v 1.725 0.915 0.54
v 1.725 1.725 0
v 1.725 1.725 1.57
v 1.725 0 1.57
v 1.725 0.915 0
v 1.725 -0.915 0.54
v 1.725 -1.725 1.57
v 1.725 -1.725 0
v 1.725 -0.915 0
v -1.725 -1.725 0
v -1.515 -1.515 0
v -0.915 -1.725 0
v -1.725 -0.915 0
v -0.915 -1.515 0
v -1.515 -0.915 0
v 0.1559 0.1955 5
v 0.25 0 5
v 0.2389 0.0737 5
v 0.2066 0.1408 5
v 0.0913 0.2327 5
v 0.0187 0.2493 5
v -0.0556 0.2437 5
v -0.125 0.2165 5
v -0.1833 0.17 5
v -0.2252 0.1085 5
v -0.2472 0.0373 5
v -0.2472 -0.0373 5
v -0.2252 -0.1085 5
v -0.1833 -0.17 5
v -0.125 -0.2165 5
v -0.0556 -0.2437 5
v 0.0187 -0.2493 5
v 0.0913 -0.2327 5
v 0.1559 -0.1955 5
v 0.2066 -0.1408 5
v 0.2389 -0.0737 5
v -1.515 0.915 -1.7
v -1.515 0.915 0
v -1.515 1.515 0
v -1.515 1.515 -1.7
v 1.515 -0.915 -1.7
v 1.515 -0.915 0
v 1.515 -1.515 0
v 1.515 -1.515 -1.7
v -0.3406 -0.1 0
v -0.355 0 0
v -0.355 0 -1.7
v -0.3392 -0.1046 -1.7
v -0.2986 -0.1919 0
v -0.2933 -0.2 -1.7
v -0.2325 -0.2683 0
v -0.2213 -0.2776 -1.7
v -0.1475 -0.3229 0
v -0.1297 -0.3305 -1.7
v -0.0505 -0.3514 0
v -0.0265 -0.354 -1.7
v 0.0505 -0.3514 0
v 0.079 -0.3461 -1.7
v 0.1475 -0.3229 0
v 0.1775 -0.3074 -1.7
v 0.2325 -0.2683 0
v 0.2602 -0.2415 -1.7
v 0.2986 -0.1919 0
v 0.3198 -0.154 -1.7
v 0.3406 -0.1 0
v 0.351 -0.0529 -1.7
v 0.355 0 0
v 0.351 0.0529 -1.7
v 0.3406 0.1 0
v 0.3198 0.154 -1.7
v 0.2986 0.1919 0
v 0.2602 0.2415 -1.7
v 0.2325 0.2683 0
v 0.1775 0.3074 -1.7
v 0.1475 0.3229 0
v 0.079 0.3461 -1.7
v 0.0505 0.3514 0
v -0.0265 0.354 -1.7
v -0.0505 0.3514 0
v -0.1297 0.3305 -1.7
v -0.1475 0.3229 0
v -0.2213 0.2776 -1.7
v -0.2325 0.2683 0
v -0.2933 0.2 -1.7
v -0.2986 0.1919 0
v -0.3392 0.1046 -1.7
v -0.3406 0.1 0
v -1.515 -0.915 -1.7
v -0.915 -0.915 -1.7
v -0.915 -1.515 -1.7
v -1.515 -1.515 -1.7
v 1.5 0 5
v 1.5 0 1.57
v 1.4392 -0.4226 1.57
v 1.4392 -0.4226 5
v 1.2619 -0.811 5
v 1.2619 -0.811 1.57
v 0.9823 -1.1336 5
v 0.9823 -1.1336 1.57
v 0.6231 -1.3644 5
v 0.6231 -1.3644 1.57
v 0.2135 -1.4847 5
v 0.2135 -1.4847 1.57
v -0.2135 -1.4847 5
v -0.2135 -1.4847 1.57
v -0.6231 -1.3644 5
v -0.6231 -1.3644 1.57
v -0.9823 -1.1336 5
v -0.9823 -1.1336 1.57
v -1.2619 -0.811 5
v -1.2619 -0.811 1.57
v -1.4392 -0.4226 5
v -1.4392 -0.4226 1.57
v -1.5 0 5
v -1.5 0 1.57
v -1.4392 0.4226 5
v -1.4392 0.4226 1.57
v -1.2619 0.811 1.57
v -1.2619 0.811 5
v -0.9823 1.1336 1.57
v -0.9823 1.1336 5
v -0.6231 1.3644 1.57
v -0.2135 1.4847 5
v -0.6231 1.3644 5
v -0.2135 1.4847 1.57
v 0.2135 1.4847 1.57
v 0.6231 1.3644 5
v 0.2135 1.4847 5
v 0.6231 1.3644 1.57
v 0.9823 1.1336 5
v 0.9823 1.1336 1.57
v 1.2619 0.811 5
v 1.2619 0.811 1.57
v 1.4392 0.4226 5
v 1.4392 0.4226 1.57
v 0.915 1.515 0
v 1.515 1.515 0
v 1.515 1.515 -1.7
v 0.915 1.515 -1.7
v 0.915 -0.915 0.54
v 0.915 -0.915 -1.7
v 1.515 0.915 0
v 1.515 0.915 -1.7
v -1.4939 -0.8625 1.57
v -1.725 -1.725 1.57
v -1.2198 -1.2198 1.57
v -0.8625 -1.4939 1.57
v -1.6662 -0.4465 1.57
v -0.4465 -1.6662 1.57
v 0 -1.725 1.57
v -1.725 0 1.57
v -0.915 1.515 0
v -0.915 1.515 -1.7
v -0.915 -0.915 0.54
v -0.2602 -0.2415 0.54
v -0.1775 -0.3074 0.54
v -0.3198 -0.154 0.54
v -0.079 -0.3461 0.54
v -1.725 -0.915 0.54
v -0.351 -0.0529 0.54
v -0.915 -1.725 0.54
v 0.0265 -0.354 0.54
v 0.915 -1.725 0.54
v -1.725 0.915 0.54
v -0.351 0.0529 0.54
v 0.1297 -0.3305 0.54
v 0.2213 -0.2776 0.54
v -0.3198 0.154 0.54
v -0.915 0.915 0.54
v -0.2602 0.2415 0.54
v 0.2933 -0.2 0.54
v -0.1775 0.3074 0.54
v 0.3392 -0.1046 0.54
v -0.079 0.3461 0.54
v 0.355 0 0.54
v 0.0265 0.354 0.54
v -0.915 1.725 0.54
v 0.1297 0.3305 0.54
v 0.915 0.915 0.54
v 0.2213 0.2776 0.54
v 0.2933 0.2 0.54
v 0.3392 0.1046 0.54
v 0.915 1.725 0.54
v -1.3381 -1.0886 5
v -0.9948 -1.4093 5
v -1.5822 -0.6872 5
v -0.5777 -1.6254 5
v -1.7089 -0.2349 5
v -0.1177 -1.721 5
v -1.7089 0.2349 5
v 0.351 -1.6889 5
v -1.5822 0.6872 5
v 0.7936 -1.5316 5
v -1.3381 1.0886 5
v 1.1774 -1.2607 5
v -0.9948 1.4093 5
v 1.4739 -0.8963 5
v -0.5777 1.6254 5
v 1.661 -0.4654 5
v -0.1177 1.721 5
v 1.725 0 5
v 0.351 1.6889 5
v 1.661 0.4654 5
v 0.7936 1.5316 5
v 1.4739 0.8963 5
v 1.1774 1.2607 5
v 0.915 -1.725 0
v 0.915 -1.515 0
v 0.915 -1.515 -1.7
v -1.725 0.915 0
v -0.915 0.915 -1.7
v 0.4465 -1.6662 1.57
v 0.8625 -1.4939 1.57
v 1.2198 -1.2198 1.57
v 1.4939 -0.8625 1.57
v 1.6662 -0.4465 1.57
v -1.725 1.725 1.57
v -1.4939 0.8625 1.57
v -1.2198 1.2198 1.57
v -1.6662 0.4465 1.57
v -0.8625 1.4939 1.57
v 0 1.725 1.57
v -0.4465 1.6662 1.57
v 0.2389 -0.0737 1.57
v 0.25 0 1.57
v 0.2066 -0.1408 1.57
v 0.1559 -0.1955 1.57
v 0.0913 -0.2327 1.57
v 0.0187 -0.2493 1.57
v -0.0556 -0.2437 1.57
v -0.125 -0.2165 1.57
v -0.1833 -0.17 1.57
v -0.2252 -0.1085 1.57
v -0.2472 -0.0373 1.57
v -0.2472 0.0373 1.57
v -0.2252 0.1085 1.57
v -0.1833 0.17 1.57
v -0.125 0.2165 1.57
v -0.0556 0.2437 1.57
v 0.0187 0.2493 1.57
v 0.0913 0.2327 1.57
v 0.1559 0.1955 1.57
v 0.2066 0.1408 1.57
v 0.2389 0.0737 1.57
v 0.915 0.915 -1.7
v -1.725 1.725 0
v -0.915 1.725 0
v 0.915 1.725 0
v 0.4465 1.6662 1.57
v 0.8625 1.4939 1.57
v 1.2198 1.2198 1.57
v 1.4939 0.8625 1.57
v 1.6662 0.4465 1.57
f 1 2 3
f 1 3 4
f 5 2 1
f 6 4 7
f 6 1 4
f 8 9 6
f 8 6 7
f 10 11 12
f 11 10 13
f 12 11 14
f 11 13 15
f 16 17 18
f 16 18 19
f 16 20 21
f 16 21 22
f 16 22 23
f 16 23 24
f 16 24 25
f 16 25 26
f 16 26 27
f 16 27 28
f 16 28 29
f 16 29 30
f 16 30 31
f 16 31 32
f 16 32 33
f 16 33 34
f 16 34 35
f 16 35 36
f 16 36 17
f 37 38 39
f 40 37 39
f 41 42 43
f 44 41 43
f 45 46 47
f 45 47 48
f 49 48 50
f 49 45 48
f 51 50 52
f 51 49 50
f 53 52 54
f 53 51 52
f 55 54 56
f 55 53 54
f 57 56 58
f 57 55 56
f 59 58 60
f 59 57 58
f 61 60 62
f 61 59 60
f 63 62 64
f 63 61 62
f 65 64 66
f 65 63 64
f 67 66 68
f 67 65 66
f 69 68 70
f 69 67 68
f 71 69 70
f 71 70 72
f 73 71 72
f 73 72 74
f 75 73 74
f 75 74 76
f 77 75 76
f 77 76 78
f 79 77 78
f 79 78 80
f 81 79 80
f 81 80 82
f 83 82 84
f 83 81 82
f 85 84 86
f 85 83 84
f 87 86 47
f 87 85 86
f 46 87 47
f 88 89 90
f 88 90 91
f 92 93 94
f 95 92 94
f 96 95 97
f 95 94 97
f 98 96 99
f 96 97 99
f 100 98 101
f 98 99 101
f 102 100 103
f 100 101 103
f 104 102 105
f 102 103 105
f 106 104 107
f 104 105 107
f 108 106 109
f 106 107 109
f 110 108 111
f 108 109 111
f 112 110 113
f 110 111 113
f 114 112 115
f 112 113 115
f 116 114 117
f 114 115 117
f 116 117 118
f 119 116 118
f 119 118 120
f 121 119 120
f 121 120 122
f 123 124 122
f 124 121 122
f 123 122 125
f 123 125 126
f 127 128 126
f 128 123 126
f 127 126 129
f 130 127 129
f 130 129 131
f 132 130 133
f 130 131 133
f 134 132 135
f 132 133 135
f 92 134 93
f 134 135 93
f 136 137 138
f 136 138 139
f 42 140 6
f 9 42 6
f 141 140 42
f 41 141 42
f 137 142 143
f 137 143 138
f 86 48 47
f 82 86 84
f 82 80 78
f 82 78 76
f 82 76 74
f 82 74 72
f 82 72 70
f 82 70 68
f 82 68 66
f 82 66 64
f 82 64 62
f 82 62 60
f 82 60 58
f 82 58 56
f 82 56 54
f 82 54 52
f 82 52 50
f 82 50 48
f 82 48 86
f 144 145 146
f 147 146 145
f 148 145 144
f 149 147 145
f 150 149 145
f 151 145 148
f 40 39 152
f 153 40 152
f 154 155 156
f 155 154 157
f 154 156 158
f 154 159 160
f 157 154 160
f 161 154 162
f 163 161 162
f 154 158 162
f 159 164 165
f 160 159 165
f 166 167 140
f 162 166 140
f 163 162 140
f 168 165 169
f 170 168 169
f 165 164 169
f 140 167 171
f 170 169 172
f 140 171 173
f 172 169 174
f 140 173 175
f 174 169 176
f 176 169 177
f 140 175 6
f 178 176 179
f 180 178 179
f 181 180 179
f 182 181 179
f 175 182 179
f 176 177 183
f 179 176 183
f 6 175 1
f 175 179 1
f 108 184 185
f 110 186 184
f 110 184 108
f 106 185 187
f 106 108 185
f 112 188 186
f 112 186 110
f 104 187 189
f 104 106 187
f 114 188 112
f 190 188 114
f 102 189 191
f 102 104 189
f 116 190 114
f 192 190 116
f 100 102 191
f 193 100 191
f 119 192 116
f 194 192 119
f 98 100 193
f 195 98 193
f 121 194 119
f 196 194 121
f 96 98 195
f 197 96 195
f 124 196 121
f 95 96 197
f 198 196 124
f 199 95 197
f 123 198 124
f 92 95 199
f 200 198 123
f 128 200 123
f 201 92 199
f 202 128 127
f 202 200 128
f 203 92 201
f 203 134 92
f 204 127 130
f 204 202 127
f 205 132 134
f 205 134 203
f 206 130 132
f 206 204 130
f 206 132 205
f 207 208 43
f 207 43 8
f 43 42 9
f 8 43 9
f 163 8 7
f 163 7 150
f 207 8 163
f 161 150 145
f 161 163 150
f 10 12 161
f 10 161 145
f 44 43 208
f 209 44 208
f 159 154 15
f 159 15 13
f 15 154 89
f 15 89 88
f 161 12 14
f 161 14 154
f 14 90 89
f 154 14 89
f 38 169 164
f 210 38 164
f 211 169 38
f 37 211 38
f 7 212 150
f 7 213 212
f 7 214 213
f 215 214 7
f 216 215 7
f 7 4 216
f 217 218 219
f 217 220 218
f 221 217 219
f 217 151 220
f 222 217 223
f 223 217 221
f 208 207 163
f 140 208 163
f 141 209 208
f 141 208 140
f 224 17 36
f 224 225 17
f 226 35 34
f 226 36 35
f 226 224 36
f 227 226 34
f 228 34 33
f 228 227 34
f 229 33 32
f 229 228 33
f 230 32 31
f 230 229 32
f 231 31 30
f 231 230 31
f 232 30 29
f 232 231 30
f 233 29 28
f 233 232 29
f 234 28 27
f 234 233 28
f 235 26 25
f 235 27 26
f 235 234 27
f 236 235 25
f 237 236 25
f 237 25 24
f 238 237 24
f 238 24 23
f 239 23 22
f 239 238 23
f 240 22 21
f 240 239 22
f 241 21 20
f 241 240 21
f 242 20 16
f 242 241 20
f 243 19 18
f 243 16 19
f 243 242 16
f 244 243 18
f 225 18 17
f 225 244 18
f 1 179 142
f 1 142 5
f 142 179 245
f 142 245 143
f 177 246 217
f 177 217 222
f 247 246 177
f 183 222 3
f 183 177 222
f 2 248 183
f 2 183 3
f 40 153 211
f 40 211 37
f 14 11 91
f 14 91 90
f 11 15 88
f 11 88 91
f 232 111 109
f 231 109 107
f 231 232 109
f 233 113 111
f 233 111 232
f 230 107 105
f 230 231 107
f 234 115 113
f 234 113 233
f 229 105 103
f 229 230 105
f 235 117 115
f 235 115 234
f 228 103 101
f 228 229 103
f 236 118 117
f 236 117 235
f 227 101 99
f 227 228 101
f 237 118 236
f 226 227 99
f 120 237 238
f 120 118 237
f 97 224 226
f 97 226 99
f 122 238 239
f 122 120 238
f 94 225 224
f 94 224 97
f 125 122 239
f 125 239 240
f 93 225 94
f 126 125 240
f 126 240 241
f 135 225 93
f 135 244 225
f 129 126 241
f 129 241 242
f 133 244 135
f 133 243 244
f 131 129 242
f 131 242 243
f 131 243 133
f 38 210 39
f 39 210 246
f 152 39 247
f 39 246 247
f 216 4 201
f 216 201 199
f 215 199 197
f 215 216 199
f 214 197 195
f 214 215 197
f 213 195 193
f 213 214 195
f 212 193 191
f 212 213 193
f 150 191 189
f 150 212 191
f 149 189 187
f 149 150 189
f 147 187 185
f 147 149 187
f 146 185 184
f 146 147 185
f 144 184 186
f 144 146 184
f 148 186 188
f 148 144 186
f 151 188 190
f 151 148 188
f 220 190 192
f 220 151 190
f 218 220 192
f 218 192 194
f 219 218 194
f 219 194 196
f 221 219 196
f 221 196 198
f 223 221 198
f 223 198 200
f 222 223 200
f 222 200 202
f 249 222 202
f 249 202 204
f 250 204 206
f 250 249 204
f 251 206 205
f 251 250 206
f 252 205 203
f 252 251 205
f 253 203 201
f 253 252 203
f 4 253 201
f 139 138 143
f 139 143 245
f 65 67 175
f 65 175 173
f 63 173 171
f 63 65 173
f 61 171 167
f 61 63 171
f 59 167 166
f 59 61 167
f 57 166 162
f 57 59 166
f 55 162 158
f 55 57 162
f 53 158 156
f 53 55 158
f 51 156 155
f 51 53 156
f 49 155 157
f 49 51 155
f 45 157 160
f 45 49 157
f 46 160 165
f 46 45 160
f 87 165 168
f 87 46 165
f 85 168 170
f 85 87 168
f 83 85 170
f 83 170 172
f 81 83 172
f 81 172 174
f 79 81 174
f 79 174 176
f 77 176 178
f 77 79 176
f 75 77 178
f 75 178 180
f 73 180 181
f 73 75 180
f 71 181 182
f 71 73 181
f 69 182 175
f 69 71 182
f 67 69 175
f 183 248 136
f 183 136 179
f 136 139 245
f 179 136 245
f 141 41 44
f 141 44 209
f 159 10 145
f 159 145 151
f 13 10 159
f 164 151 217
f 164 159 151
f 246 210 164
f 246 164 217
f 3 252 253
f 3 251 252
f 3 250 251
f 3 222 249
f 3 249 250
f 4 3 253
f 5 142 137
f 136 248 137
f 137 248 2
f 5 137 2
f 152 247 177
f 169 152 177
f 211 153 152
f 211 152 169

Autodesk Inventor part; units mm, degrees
ref_plane "YZ Plane" through (0, 0, 0) normal (1, 0, 0) x (0, 1, 0)
ref_plane "XZ Plane" through (0, 0, 0) normal (0, 1, 0) x (-1, 0, 0)
sketch "Sketch1" plane through (0, 0, 0) normal (0, 0, 1) x (1, 0, 0)
  line L0 (0, 0) -> (0.4099, 0)
  line L1 (0, 0) -> (0, 0.6993)
  circle A0 centre (0, 0) radius 0.355
  line L2 (-1.725, 1.725) -> (1.725, 1.725) construction
  line L3 (1.725, 1.725) -> (1.725, -1.725) construction
  line L4 (1.725, -1.725) -> (-1.725, -1.725) construction
  line L5 (-1.725, -1.725) -> (-1.725, 1.725) construction
  line L6 (-1.725, 1.725) -> (-0.915, 1.725)
  line L7 (-0.915, 1.725) -> (-0.915, 0.915)
  line L8 (-0.915, 0.915) -> (-1.725, 0.915)
  line L9 (-1.725, 0.915) -> (-1.725, 1.725)
  line L10 (-1.725, -1.725) -> (-0.915, -1.725)
  line L11 (-0.915, -1.725) -> (-0.915, -0.915)
  line L12 (-0.915, -0.915) -> (-1.725, -0.915)
  line L13 (-1.725, -0.915) -> (-1.725, -1.725)
  line L14 (1.725, -1.725) -> (0.915, -1.725)
  line L15 (0.915, -1.725) -> (0.915, -0.915)
  line L16 (0.915, -0.915) -> (1.725, -0.915)
  line L17 (1.725, -0.915) -> (1.725, -1.725)
  line L18 (1.725, 1.725) -> (0.915, 1.725)
  line L19 (0.915, 1.725) -> (0.915, 0.915)
  line L20 (0.915, 0.915) -> (1.725, 0.915)
  line L21 (1.725, 0.915) -> (1.725, 1.725)
  dimension "d25" = 3.45
  dimension "d26" = 3.45
  dimension "d27" = 0.81
  dimension "d28" = 0.71
extrude "Extrusion1" add sketch "Sketch1" along normal blind 0.54
ref_plane "Work Plane2" through (0, 0, 0.54) normal (0, 0, 1) x (1, 0, 0)
sketch "Sketch2" plane through (0, 0, 0.54) normal (0, 0, 1) x (1, 0, 0)
  line L0 (-1.725, 1.725) -> (1.725, 1.725)
  line L1 (1.725, 1.725) -> (1.725, -1.725)
  line L2 (1.725, -1.725) -> (-1.725, -1.725)
  line L3 (-1.725, -1.725) -> (-1.725, 1.725)
  line L4 (0, 0) -> (0.4406, 0)
  line L5 (0, 0) -> (0, 0.4944)
extrude "Extrusion2" add sketch "Sketch2" along normal blind 1.03
sketch "Sketch3" plane through (0, 0, 1.57) normal (0, 0, 1) x (1, 0, 0)
  circle A0 centre (0, 0) radius 1.725
  circle A1 centre (0, 0) radius 1.5
  circle A2 centre (0, 0) radius 0.25
  dimension "d20" = 0.5
  dimension "d21" = 3.45
  dimension "d22" = 3
extrude "Extrusion3" add sketch "Sketch3" along normal blind 3.43
sketch "Sketch4" plane through (0, 0, 0) normal (0, 0, -1) x (-1, 0, 0)
  circle A0 centre (0, 0) radius 0.355 projected
  circle A1 centre (0, 0) radius 0.355
  line L0 (-0.915, 0.915) -> (-1.515, 0.915)
  line L1 (-1.515, 0.915) -> (-1.515, 1.515)
  line L2 (-1.515, 1.515) -> (-0.915, 1.515)
  line L3 (-0.915, 1.515) -> (-0.915, 0.915)
  line L4 (0.915, 0.915) -> (1.515, 0.915)
  line L5 (1.515, 0.915) -> (1.515, 1.515)
  line L6 (1.515, 1.515) -> (0.915, 1.515)
  line L7 (0.915, 1.515) -> (0.915, 0.915)
  line L8 (0.915, -0.915) -> (1.515, -0.915)
  line L9 (1.515, -0.915) -> (1.515, -1.515)
  line L10 (1.515, -1.515) -> (0.915, -1.515)
  line L11 (0.915, -1.515) -> (0.915, -0.915)
  line L12 (-0.915, -0.915) -> (-1.515, -0.915)
  line L13 (-1.515, -0.915) -> (-1.515, -1.515)
  line L14 (-1.515, -1.515) -> (-0.915, -1.515)
  line L15 (-0.915, -1.515) -> (-0.915, -0.915)
  dimension "d29" = 0.6
extrude "Extrusion4" add sketch "Sketch4" along normal blind 1.7
properties part number "MMCX_thru" material "Brass, Soft Yellow"
